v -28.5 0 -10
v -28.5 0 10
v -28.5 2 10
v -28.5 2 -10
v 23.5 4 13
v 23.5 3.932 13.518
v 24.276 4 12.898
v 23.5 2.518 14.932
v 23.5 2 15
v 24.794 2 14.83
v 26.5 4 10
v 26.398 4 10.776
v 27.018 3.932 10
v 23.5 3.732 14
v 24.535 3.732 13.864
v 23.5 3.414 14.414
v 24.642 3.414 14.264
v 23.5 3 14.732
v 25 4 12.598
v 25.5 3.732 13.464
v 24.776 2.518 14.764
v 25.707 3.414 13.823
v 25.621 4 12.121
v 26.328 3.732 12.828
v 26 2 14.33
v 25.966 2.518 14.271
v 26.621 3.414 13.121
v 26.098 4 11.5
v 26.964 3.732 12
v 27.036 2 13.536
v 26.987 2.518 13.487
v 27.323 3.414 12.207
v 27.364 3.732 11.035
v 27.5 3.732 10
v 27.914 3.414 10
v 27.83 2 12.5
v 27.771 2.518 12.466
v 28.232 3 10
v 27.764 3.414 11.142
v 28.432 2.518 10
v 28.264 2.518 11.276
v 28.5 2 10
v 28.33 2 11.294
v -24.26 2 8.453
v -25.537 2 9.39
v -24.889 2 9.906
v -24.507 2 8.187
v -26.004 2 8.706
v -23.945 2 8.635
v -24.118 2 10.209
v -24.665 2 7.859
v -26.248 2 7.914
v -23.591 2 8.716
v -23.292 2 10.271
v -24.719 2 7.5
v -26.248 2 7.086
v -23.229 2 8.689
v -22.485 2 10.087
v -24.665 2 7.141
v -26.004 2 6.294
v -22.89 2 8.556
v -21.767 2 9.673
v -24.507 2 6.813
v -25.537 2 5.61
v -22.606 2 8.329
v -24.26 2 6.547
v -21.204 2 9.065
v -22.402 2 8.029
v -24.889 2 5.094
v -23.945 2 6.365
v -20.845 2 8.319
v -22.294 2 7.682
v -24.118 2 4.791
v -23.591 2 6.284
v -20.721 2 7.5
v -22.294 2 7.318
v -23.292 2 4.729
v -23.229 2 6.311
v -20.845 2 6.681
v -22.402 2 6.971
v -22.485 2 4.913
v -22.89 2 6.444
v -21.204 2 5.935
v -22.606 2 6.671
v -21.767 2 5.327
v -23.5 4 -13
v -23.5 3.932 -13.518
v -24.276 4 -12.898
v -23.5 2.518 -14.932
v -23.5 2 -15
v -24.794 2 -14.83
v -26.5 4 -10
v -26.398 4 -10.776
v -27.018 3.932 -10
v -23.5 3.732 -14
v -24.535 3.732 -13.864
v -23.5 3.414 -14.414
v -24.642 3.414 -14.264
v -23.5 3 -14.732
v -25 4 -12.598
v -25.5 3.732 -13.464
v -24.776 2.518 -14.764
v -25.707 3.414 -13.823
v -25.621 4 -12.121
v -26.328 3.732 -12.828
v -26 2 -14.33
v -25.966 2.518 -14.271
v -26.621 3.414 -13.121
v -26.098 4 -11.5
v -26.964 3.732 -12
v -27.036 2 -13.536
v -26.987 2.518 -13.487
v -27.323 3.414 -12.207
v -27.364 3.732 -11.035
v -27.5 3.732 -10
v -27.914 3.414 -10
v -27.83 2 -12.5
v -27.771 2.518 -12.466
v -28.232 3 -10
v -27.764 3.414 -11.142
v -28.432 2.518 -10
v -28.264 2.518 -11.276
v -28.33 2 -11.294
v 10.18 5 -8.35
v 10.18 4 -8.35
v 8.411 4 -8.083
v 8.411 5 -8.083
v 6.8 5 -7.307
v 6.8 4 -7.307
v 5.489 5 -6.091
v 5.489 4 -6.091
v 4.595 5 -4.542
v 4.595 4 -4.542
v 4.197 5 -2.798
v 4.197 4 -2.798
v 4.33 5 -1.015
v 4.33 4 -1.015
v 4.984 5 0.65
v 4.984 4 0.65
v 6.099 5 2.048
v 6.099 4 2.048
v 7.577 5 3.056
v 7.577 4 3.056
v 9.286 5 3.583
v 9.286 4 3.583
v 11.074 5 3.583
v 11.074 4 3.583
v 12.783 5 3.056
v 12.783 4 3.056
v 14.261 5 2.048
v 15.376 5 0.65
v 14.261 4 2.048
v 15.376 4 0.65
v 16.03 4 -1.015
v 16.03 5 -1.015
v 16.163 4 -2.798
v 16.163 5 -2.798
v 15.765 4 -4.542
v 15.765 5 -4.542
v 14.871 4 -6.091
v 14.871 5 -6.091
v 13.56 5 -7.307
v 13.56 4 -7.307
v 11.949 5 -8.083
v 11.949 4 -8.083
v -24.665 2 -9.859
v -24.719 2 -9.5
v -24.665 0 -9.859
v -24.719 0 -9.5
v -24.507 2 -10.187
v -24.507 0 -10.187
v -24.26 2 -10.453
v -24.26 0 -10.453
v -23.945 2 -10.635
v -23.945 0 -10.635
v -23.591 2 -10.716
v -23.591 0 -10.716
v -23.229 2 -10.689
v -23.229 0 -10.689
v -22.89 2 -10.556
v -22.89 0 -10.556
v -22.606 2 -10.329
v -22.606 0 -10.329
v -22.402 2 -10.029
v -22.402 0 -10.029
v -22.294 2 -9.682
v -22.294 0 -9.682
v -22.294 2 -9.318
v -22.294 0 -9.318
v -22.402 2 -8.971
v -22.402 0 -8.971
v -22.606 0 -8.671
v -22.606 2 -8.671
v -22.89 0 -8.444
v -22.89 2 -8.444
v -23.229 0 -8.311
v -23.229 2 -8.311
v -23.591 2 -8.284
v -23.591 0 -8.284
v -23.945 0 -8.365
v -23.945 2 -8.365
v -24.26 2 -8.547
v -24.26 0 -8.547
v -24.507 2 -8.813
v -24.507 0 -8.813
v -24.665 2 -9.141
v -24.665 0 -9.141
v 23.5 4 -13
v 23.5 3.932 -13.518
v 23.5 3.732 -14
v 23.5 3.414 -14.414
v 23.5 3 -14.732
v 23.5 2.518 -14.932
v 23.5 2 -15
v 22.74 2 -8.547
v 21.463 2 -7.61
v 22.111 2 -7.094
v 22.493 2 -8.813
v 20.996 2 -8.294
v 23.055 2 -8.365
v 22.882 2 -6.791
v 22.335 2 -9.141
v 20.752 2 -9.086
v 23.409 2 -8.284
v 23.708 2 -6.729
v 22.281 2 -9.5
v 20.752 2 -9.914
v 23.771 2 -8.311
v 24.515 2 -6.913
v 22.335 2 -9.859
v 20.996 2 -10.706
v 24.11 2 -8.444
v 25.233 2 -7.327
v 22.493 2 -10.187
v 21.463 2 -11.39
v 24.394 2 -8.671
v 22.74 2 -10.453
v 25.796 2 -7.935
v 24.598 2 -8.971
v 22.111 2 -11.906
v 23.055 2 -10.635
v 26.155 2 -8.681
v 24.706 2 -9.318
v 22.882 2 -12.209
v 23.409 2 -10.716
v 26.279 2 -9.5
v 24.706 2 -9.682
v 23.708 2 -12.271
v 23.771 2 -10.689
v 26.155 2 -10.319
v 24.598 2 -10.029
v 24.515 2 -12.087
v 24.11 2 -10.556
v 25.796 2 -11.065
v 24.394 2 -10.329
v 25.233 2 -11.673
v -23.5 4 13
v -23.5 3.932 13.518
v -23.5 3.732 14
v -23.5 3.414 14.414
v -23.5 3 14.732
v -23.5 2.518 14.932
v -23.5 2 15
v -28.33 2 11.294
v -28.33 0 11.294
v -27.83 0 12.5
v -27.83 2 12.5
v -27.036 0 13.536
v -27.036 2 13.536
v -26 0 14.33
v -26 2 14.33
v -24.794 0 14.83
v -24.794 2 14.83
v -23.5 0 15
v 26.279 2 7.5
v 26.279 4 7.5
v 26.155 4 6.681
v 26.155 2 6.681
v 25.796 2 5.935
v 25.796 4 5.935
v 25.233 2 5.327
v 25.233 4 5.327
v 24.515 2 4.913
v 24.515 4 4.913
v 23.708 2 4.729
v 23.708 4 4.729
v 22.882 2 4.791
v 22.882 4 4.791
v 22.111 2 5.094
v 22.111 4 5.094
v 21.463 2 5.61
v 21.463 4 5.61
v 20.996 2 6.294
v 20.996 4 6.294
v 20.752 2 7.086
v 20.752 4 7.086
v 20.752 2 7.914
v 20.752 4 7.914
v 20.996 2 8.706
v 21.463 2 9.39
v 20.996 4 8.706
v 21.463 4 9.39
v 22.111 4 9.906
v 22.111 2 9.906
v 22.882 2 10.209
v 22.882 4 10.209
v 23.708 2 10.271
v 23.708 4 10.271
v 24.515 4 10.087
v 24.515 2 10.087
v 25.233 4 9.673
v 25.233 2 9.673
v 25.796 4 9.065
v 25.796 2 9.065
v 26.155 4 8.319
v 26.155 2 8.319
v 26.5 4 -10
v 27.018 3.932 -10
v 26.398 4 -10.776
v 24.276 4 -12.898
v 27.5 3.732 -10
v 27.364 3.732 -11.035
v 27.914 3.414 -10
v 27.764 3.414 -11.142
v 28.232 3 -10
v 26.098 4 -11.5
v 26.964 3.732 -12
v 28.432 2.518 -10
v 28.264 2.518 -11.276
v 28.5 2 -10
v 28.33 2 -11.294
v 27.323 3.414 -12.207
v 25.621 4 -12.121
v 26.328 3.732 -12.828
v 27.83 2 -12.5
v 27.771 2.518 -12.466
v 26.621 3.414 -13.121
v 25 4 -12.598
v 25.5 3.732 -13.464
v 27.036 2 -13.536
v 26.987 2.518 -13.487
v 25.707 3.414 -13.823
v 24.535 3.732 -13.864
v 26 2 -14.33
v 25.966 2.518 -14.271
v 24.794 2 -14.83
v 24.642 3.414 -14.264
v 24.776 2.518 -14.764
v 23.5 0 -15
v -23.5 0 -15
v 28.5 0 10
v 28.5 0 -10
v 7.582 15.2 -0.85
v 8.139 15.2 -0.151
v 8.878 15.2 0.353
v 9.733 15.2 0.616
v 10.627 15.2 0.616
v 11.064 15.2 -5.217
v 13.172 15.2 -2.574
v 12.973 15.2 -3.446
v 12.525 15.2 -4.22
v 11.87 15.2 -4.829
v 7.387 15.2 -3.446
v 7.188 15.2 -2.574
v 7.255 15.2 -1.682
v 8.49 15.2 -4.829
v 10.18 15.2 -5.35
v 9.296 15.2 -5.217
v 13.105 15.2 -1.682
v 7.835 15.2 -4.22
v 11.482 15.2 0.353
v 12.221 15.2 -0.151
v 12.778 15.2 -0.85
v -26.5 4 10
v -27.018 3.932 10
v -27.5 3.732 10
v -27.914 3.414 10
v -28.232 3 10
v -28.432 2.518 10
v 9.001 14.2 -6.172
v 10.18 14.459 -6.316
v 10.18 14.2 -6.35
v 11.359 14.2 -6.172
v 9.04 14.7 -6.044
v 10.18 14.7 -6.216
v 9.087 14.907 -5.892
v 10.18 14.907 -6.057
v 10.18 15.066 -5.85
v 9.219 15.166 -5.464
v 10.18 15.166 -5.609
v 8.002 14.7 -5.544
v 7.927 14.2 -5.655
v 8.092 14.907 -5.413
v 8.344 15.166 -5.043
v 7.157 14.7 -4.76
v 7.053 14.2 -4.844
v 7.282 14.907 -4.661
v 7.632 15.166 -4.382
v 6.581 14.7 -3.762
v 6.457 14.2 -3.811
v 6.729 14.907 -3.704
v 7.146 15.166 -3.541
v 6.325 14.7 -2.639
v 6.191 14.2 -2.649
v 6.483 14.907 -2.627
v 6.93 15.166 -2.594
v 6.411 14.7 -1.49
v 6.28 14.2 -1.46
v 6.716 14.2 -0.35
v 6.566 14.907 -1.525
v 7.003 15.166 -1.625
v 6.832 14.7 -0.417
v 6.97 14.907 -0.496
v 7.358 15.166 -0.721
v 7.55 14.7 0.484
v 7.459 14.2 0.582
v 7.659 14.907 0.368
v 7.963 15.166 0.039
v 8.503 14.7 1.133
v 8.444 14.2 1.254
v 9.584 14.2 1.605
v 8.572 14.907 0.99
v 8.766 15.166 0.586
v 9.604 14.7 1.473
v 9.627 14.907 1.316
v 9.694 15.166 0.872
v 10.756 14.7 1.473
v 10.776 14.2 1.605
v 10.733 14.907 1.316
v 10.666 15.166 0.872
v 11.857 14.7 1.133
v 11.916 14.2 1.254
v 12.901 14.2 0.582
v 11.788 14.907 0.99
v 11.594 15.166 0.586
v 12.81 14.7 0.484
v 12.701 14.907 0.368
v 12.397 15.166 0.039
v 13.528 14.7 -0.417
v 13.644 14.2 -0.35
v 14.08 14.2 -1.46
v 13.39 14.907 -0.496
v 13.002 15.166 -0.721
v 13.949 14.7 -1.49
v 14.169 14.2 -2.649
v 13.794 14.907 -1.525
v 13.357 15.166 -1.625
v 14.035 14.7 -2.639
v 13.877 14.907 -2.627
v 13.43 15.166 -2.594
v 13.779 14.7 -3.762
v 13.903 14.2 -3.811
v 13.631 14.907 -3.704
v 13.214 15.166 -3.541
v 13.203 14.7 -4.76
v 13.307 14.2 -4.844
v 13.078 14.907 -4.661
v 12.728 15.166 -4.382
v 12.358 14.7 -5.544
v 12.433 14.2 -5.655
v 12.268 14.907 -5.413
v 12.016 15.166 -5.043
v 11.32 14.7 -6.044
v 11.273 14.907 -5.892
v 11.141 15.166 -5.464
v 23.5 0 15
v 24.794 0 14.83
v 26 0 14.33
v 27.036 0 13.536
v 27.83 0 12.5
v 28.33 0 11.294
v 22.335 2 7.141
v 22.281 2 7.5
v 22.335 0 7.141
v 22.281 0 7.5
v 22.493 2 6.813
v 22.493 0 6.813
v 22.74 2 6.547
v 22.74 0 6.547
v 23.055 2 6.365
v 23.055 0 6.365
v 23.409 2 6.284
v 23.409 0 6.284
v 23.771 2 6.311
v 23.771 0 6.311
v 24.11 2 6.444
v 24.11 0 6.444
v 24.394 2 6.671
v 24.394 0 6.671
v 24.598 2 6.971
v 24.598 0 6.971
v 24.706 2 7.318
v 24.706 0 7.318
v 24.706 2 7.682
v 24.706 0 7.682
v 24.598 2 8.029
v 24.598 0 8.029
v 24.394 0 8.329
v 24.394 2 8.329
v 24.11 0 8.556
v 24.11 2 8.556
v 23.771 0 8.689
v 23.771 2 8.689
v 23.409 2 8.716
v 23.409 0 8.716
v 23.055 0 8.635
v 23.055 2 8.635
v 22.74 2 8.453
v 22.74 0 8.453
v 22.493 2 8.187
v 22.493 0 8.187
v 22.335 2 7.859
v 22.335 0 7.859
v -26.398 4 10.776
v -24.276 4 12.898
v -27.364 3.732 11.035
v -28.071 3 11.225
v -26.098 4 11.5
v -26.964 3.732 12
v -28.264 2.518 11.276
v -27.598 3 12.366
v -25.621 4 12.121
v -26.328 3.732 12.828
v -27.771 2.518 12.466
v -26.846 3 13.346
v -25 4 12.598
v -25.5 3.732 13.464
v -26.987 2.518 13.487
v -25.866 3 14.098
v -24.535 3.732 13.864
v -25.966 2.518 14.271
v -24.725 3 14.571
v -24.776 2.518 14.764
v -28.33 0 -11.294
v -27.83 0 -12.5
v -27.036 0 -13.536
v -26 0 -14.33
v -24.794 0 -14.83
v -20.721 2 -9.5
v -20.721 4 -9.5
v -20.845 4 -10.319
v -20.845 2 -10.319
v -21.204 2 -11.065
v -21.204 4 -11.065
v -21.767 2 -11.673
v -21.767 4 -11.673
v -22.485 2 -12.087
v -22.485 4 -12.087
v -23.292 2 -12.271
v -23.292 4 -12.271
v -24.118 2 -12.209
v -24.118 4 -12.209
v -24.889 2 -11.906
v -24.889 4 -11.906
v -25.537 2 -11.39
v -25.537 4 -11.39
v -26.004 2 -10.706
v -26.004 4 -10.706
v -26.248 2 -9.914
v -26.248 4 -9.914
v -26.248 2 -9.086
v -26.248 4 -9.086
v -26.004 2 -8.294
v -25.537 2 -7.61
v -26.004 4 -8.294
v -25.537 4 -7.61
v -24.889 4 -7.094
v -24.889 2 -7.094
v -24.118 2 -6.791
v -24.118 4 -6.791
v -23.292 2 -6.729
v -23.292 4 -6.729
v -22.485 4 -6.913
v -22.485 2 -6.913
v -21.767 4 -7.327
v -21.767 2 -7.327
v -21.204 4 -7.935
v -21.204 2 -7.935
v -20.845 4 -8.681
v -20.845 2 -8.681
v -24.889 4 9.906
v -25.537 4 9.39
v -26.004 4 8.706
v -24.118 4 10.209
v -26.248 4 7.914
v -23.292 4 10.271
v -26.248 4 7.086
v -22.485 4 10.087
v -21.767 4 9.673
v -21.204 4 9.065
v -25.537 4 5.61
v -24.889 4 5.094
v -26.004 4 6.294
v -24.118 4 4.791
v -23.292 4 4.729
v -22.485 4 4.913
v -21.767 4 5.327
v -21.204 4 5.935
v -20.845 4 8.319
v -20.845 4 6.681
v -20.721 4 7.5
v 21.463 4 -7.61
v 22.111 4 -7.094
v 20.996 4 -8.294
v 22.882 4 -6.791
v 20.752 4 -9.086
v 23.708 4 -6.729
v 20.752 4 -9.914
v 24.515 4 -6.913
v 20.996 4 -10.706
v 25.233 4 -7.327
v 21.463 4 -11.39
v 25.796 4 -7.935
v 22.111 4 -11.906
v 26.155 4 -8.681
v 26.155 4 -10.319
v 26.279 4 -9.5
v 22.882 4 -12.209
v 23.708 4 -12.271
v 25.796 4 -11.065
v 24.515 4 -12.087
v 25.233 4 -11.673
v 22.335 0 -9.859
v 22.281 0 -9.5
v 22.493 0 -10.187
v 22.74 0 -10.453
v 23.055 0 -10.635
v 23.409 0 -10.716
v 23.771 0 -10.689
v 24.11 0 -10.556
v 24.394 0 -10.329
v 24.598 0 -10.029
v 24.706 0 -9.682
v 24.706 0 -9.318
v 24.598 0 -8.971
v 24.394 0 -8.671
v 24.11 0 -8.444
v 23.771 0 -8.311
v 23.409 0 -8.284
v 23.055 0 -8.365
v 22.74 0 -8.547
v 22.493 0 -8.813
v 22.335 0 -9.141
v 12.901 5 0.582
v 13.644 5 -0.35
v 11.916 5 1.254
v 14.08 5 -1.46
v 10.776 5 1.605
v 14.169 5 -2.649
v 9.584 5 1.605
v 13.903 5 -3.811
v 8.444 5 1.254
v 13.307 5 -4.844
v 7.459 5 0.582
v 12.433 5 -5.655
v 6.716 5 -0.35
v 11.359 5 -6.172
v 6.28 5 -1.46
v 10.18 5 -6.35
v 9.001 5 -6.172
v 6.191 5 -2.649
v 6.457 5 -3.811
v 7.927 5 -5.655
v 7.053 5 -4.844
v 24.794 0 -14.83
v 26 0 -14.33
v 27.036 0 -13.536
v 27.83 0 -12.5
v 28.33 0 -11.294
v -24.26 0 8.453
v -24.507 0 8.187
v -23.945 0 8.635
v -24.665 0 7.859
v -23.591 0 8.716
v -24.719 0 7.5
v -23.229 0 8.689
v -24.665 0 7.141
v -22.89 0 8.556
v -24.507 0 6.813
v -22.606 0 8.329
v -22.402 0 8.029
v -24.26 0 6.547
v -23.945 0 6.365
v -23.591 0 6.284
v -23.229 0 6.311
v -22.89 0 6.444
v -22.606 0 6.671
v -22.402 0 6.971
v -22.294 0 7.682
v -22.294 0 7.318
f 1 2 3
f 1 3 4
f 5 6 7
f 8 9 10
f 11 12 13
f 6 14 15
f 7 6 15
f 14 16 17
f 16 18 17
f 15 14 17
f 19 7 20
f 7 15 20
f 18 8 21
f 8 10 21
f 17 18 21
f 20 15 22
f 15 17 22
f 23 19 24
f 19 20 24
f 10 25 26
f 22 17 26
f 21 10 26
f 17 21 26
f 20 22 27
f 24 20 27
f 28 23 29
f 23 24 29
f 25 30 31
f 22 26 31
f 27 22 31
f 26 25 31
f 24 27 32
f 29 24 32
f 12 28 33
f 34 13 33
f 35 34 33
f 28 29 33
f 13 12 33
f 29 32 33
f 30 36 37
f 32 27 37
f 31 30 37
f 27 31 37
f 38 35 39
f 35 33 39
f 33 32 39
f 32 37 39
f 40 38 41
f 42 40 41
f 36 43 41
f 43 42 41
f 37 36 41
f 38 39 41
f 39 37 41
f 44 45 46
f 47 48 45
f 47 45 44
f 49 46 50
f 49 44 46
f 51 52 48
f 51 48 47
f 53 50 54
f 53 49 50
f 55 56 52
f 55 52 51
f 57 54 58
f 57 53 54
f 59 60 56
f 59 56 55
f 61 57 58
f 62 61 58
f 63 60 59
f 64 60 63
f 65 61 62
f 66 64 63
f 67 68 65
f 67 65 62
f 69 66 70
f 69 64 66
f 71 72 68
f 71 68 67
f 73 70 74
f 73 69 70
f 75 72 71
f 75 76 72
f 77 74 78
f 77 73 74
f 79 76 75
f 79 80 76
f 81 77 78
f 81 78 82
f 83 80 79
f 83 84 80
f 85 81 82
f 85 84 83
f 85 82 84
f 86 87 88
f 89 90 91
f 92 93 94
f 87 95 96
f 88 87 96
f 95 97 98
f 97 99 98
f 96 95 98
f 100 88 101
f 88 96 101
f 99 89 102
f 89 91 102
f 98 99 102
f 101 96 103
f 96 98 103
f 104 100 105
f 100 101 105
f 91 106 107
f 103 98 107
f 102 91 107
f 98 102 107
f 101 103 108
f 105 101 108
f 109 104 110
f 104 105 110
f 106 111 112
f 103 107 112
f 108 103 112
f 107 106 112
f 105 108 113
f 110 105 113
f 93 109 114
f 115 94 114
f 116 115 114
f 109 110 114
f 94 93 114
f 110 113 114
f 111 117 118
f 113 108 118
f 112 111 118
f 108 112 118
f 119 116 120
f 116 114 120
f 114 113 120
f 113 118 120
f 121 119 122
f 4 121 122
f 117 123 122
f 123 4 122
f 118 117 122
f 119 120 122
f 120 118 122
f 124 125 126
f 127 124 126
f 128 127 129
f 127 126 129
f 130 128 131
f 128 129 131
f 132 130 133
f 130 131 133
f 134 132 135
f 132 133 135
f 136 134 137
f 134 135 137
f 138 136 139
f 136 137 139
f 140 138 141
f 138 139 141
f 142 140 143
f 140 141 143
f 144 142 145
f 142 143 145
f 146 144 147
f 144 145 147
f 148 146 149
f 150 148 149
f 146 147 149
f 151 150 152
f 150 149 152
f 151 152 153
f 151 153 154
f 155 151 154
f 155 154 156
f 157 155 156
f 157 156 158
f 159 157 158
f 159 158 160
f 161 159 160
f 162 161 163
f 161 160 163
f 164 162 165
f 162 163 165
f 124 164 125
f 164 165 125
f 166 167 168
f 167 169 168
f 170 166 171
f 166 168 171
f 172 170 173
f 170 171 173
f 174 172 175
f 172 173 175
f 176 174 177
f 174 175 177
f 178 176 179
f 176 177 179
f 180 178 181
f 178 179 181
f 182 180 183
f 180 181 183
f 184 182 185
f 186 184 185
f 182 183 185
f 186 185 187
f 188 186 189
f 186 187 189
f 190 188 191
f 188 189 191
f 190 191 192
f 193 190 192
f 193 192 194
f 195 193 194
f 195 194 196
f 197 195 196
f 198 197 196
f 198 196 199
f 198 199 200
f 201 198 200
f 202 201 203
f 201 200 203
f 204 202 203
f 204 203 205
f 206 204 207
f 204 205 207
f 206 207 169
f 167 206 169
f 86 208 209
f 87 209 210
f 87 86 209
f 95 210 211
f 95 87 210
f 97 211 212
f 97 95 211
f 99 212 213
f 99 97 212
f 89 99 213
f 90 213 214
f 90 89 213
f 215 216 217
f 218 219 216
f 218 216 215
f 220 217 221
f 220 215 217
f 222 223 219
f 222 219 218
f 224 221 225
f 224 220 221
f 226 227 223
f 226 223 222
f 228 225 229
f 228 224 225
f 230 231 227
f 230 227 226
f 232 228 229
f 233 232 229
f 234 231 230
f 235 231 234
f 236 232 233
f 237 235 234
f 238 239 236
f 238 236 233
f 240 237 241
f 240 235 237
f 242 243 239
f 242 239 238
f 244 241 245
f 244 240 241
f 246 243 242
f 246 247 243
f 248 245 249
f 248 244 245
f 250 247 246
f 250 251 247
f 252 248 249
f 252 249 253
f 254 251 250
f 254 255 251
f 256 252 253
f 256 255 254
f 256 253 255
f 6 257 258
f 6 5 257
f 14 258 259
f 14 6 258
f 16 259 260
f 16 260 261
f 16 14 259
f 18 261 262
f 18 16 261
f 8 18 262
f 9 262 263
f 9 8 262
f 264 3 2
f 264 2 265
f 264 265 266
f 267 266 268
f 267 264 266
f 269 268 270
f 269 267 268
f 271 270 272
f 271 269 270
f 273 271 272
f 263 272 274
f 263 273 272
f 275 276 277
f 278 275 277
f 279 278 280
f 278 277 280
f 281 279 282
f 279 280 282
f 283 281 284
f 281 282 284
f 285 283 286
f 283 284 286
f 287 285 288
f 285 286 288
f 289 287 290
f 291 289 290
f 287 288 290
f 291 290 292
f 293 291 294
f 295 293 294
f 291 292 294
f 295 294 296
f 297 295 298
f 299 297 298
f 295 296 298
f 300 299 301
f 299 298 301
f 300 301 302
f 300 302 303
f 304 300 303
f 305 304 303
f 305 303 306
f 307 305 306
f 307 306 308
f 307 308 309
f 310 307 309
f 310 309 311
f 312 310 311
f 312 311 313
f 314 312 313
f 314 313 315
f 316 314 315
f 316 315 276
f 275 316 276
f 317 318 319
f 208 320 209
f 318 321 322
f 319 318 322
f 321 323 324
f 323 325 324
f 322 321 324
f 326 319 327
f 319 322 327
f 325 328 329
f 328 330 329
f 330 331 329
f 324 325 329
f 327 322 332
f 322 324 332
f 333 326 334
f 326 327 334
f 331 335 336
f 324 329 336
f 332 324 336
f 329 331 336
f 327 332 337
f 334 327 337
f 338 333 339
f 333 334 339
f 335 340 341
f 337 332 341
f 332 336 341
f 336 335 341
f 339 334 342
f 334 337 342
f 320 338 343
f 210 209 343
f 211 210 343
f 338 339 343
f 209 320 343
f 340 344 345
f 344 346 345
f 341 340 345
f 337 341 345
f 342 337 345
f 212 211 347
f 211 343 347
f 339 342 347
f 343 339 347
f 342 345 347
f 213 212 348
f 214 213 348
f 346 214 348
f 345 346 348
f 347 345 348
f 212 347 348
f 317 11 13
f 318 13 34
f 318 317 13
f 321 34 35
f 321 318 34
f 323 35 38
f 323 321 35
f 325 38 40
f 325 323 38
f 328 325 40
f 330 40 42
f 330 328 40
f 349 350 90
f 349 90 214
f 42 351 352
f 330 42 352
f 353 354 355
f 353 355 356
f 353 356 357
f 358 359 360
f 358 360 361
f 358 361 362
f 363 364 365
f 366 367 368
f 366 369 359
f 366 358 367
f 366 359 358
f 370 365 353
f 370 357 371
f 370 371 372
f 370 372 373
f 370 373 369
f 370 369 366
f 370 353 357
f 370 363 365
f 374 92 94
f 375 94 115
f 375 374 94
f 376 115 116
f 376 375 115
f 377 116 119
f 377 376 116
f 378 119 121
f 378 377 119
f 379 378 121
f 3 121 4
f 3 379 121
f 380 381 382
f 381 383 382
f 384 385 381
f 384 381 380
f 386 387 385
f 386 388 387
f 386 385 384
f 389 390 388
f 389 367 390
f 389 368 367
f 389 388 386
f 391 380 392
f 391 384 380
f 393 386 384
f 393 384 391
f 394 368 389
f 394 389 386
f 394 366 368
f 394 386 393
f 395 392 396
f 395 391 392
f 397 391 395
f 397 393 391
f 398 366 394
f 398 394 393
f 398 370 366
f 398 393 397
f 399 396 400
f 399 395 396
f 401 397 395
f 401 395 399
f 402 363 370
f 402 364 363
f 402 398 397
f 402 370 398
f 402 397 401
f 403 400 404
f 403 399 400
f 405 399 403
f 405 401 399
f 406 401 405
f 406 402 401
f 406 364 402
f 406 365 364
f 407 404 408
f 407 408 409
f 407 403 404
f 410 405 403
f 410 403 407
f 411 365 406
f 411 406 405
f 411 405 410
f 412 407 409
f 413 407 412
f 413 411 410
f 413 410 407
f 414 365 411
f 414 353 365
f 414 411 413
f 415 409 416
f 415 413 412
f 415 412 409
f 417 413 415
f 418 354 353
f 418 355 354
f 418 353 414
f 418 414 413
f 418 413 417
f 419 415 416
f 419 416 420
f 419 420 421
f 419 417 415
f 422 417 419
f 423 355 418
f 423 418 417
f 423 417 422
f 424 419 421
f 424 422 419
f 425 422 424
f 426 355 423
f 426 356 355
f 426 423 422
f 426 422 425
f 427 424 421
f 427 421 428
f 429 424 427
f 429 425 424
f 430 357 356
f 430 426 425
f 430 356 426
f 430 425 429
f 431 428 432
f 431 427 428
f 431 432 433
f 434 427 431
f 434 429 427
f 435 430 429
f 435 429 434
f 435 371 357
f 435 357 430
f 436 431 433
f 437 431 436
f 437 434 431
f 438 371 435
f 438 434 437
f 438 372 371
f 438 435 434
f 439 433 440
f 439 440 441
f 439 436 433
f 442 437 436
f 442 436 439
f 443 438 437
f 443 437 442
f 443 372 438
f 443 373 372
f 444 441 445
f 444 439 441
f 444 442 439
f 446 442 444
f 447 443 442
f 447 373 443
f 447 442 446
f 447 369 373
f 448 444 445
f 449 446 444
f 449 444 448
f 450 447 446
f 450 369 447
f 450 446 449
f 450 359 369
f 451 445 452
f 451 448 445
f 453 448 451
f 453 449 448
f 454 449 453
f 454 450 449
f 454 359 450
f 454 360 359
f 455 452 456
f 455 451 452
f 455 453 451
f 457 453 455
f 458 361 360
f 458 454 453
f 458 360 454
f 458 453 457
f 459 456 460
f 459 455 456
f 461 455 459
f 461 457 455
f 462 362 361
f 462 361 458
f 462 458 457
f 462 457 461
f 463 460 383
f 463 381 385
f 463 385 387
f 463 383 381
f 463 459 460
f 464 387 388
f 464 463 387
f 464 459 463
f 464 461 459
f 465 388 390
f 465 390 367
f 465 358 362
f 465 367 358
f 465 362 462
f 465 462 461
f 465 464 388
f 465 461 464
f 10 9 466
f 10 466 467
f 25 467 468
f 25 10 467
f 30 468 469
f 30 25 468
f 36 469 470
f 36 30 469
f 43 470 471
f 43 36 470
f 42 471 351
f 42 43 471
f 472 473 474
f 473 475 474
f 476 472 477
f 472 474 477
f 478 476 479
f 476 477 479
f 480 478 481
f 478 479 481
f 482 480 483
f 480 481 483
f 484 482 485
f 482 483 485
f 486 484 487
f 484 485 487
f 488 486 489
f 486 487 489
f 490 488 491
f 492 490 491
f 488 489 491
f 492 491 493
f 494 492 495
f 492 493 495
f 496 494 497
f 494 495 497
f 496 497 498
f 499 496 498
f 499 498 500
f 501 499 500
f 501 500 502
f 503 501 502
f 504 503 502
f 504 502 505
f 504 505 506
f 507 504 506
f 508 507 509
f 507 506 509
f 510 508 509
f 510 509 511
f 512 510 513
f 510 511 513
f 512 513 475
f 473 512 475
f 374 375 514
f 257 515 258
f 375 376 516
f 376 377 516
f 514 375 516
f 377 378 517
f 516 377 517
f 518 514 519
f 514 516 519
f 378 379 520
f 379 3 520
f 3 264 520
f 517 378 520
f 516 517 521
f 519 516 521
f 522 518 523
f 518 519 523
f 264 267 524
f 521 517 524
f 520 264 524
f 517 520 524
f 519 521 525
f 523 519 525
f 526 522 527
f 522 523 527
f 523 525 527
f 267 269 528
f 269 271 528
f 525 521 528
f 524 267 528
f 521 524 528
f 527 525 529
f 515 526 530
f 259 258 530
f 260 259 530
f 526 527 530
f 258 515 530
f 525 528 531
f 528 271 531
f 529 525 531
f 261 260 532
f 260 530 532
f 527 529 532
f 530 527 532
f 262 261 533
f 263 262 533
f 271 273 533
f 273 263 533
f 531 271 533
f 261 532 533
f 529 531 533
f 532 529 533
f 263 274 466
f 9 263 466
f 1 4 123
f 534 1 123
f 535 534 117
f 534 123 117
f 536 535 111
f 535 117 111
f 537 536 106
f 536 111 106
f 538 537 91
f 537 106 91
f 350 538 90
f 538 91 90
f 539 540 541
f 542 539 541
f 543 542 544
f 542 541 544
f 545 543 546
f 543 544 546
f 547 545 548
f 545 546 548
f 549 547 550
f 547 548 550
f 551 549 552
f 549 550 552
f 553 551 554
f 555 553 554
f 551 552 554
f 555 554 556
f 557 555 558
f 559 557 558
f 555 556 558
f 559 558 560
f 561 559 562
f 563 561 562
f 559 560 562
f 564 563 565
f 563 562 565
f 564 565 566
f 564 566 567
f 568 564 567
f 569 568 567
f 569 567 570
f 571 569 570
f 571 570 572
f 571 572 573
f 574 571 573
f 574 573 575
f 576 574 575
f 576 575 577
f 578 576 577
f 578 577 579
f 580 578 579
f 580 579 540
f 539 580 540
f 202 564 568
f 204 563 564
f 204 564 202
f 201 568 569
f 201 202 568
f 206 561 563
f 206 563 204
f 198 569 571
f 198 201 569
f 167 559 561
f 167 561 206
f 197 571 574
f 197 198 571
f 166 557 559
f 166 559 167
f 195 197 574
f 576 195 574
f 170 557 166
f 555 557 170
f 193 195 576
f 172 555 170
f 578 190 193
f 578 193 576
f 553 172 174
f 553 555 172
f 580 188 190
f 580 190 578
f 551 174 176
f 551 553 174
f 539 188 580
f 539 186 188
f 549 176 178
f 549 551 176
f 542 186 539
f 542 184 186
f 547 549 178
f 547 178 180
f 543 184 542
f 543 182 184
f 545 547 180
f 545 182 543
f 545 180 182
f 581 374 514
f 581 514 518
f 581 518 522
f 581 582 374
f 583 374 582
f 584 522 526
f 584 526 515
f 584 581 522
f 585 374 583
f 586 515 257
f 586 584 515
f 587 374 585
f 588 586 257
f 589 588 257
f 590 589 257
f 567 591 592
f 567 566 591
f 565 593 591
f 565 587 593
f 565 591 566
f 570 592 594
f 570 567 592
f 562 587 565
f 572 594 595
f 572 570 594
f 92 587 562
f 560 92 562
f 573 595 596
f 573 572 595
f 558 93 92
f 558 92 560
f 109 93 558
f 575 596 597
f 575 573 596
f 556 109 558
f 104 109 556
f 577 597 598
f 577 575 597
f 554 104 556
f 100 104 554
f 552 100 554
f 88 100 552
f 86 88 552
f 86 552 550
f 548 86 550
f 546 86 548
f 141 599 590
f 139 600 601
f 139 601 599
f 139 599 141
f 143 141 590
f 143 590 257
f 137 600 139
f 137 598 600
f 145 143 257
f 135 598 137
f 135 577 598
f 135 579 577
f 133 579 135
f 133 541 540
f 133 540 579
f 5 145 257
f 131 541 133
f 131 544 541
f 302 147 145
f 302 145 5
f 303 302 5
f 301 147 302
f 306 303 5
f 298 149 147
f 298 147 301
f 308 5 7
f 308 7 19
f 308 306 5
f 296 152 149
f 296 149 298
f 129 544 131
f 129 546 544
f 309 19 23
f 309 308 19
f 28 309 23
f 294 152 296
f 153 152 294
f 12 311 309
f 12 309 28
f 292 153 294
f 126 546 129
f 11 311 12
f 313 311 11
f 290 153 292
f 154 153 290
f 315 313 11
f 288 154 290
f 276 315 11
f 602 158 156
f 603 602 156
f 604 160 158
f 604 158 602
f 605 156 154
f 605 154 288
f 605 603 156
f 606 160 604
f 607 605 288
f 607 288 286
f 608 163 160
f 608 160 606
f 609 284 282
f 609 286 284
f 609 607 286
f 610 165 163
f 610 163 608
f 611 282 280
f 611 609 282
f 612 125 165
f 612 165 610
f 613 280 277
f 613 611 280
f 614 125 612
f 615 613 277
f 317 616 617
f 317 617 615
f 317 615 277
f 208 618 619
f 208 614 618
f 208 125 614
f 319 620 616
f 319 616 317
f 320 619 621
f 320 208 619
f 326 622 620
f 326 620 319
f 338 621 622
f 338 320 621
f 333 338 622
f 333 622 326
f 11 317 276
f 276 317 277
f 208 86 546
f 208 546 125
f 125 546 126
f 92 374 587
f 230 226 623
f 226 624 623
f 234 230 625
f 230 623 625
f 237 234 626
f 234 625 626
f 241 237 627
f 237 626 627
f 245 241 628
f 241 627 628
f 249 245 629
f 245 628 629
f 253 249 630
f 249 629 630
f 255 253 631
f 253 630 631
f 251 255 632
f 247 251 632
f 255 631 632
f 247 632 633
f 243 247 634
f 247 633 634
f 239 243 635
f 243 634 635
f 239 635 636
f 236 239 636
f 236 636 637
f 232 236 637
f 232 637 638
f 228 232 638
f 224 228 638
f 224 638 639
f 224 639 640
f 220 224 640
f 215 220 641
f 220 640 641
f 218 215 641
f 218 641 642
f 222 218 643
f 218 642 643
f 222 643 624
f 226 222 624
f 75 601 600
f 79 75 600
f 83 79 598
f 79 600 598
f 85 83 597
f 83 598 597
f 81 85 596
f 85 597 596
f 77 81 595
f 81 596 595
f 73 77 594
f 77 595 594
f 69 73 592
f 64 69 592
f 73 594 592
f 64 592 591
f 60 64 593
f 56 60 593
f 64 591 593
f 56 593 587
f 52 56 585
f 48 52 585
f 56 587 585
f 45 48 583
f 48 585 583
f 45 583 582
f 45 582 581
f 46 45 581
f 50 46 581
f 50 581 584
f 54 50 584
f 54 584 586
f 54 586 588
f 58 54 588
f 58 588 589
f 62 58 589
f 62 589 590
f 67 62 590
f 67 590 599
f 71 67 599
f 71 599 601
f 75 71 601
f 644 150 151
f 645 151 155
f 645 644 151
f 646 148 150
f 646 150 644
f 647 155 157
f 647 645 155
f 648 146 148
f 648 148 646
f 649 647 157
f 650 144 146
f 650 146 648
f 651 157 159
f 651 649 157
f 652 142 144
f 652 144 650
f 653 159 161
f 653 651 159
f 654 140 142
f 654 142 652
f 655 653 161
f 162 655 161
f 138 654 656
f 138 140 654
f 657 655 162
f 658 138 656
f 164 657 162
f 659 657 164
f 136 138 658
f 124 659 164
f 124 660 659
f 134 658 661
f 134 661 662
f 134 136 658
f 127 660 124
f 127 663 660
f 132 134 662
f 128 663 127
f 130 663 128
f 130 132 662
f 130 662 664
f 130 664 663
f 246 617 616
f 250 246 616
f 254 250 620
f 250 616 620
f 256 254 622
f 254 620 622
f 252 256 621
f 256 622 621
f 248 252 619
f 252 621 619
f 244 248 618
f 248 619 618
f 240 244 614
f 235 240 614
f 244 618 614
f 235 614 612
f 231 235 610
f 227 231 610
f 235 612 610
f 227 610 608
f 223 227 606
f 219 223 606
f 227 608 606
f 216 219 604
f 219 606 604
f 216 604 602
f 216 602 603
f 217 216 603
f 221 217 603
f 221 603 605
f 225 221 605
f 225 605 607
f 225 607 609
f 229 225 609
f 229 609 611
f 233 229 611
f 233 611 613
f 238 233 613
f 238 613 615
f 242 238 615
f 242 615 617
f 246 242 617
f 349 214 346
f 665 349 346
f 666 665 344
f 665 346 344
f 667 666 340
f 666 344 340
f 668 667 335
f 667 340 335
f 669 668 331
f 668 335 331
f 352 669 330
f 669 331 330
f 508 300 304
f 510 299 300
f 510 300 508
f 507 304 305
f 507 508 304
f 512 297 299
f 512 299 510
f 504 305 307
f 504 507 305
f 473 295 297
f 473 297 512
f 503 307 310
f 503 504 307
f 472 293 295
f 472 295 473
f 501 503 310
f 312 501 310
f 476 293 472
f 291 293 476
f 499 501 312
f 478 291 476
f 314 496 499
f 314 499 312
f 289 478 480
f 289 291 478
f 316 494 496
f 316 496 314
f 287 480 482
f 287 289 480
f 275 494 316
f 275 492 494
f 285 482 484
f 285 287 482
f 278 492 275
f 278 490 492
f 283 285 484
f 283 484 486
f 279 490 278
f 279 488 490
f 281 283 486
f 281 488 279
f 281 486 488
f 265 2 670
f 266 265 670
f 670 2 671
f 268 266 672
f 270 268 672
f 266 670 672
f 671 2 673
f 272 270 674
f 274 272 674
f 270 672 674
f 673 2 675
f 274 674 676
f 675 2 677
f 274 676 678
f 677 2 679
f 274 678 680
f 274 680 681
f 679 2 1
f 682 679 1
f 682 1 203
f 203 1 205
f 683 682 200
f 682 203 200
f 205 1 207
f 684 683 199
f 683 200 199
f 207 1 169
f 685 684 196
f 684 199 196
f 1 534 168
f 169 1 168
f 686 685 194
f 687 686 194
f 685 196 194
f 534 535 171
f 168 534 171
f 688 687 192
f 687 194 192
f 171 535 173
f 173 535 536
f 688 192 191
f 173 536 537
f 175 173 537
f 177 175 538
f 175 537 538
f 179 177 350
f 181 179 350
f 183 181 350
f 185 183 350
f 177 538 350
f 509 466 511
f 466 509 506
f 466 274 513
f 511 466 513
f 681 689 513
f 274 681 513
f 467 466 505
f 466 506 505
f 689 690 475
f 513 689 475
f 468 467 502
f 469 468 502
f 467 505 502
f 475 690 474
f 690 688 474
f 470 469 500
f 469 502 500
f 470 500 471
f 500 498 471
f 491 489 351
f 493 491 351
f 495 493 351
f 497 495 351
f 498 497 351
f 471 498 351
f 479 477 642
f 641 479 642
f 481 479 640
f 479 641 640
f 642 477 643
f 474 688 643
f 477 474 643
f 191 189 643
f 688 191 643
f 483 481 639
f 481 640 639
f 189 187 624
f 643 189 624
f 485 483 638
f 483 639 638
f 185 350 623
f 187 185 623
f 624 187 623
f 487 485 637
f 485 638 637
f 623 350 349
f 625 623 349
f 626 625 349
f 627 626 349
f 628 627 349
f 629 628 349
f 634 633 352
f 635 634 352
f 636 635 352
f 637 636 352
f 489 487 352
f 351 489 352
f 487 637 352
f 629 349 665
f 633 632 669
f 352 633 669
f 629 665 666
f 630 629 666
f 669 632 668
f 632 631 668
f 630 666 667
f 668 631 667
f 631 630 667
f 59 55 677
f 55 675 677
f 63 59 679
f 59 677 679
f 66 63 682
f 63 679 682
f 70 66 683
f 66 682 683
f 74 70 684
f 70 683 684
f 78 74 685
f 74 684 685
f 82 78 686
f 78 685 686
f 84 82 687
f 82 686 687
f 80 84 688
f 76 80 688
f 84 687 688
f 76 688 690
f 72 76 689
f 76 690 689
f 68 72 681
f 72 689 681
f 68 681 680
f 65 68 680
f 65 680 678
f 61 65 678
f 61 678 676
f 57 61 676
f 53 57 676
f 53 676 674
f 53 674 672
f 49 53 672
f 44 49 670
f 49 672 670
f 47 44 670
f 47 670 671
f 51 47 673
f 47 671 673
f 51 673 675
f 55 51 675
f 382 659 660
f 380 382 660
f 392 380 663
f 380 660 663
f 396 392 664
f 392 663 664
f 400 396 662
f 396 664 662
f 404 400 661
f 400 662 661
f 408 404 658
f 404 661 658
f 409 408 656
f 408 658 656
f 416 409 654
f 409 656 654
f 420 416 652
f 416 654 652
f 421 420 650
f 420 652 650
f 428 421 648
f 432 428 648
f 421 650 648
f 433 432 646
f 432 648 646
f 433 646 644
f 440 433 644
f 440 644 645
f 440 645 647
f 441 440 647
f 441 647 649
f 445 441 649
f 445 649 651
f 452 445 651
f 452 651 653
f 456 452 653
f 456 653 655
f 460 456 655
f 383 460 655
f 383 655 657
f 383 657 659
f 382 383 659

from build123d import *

# Parameters (mm, degrees)
SKETCH1_W                                           = 57
SKETCH1_H                                           = 30
BOSS_EXTRUDE1_DEPTH                                 = 4
SKETCH3_R                                           = 4
BOSS_EXTRUDE2_DEPTH                                 = 11.2
SKETCH4_R                                           = 6
BOSS_EXTRUDE3_DEPTH                                 = 1
CBORE_FOR_2_BINDING_HEAD_MACHINE_SCREW1_D           = 2.4384
CBORE_FOR_2_BINDING_HEAD_MACHINE_SCREW1_CBORE_D     = 5.55752
CBORE_FOR_2_BINDING_HEAD_MACHINE_SCREW1_CBORE_DEPTH = 2.000000064
FILLET1_R                                           = 5
FILLET2_R                                           = 2
FILLET3_R                                           = 1


with BuildPart() as part:
    # Sketch1 → Boss-Extrude1 (new body)
    with BuildSketch(Plane(origin=(0, 0, 0), x_dir=(1, 0, 0), z_dir=(0, 1, 0))):
        Rectangle(SKETCH1_W, SKETCH1_H)
    extrude(amount=BOSS_EXTRUDE1_DEPTH)

    # Sketch3 → Boss-Extrude2 (add)
    with BuildSketch(Plane(origin=(0, 4, 0), x_dir=(1, 0, 0), z_dir=(0, 1, 0))):
        with Locations(Location((10.18, 2.35, 0), (0, 0, 90))):
            Circle(SKETCH3_R)
    extrude(amount=BOSS_EXTRUDE2_DEPTH)

    # Sketch4 → Boss-Extrude3 (add)
    with BuildSketch(Plane(origin=(0, 4, 0), x_dir=(1, 0, 0), z_dir=(0, 1, 0))):
        with Locations(Location((10.18, 2.35, 0), (0, 0, 90))):
            Circle(SKETCH4_R)
    extrude(amount=BOSS_EXTRUDE3_DEPTH)

    # CBORE for #2 Binding Head Machine Screw1 (through all)
    with Locations(Plane(origin=(0, 4, 0), x_dir=(1, 0, 0), z_dir=(0, 1, 0))):
        with Locations((-23.5, 9.5), (-23.5, -7.5), (23.5, -7.5), (23.5, 9.5)):
            CounterBoreHole(CBORE_FOR_2_BINDING_HEAD_MACHINE_SCREW1_D / 2, CBORE_FOR_2_BINDING_HEAD_MACHINE_SCREW1_CBORE_D / 2, CBORE_FOR_2_BINDING_HEAD_MACHINE_SCREW1_CBORE_DEPTH)

    # Fillet1
    fillet1_edges = [part.edges().sort_by_distance(p)[0] for p in [
        (-28.5, 2, -15),
        (28.5, 2, -15),
        (28.5, 2, 15),
        (-28.5, 2, 15),
    ]]
    fillet(fillet1_edges, radius=FILLET1_R)

    # Fillet2
    fillet2_edges = [part.edges().sort_by_distance(p)[0] for p in [
        (0, 4, 15),
        (-28.5, 4, 0),
        (28.5, 4, 0),
        (0, 4, -15),
        (27.035533906, 4, 13.535533906),
        (27.035533906, 4, -13.535533906),
        (-27.035533906, 4, -13.535533906),
        (-27.035533906, 4, 13.535533906),
    ]]
    fillet(fillet2_edges, radius=FILLET2_R)

    # Fillet3
    fillet3_edges = [part.edges().sort_by_distance(p)[0] for p in [
        (10.18, 15.2, 1.65),
    ]]
    fillet(fillet3_edges, radius=FILLET3_R)


solid = part.part
